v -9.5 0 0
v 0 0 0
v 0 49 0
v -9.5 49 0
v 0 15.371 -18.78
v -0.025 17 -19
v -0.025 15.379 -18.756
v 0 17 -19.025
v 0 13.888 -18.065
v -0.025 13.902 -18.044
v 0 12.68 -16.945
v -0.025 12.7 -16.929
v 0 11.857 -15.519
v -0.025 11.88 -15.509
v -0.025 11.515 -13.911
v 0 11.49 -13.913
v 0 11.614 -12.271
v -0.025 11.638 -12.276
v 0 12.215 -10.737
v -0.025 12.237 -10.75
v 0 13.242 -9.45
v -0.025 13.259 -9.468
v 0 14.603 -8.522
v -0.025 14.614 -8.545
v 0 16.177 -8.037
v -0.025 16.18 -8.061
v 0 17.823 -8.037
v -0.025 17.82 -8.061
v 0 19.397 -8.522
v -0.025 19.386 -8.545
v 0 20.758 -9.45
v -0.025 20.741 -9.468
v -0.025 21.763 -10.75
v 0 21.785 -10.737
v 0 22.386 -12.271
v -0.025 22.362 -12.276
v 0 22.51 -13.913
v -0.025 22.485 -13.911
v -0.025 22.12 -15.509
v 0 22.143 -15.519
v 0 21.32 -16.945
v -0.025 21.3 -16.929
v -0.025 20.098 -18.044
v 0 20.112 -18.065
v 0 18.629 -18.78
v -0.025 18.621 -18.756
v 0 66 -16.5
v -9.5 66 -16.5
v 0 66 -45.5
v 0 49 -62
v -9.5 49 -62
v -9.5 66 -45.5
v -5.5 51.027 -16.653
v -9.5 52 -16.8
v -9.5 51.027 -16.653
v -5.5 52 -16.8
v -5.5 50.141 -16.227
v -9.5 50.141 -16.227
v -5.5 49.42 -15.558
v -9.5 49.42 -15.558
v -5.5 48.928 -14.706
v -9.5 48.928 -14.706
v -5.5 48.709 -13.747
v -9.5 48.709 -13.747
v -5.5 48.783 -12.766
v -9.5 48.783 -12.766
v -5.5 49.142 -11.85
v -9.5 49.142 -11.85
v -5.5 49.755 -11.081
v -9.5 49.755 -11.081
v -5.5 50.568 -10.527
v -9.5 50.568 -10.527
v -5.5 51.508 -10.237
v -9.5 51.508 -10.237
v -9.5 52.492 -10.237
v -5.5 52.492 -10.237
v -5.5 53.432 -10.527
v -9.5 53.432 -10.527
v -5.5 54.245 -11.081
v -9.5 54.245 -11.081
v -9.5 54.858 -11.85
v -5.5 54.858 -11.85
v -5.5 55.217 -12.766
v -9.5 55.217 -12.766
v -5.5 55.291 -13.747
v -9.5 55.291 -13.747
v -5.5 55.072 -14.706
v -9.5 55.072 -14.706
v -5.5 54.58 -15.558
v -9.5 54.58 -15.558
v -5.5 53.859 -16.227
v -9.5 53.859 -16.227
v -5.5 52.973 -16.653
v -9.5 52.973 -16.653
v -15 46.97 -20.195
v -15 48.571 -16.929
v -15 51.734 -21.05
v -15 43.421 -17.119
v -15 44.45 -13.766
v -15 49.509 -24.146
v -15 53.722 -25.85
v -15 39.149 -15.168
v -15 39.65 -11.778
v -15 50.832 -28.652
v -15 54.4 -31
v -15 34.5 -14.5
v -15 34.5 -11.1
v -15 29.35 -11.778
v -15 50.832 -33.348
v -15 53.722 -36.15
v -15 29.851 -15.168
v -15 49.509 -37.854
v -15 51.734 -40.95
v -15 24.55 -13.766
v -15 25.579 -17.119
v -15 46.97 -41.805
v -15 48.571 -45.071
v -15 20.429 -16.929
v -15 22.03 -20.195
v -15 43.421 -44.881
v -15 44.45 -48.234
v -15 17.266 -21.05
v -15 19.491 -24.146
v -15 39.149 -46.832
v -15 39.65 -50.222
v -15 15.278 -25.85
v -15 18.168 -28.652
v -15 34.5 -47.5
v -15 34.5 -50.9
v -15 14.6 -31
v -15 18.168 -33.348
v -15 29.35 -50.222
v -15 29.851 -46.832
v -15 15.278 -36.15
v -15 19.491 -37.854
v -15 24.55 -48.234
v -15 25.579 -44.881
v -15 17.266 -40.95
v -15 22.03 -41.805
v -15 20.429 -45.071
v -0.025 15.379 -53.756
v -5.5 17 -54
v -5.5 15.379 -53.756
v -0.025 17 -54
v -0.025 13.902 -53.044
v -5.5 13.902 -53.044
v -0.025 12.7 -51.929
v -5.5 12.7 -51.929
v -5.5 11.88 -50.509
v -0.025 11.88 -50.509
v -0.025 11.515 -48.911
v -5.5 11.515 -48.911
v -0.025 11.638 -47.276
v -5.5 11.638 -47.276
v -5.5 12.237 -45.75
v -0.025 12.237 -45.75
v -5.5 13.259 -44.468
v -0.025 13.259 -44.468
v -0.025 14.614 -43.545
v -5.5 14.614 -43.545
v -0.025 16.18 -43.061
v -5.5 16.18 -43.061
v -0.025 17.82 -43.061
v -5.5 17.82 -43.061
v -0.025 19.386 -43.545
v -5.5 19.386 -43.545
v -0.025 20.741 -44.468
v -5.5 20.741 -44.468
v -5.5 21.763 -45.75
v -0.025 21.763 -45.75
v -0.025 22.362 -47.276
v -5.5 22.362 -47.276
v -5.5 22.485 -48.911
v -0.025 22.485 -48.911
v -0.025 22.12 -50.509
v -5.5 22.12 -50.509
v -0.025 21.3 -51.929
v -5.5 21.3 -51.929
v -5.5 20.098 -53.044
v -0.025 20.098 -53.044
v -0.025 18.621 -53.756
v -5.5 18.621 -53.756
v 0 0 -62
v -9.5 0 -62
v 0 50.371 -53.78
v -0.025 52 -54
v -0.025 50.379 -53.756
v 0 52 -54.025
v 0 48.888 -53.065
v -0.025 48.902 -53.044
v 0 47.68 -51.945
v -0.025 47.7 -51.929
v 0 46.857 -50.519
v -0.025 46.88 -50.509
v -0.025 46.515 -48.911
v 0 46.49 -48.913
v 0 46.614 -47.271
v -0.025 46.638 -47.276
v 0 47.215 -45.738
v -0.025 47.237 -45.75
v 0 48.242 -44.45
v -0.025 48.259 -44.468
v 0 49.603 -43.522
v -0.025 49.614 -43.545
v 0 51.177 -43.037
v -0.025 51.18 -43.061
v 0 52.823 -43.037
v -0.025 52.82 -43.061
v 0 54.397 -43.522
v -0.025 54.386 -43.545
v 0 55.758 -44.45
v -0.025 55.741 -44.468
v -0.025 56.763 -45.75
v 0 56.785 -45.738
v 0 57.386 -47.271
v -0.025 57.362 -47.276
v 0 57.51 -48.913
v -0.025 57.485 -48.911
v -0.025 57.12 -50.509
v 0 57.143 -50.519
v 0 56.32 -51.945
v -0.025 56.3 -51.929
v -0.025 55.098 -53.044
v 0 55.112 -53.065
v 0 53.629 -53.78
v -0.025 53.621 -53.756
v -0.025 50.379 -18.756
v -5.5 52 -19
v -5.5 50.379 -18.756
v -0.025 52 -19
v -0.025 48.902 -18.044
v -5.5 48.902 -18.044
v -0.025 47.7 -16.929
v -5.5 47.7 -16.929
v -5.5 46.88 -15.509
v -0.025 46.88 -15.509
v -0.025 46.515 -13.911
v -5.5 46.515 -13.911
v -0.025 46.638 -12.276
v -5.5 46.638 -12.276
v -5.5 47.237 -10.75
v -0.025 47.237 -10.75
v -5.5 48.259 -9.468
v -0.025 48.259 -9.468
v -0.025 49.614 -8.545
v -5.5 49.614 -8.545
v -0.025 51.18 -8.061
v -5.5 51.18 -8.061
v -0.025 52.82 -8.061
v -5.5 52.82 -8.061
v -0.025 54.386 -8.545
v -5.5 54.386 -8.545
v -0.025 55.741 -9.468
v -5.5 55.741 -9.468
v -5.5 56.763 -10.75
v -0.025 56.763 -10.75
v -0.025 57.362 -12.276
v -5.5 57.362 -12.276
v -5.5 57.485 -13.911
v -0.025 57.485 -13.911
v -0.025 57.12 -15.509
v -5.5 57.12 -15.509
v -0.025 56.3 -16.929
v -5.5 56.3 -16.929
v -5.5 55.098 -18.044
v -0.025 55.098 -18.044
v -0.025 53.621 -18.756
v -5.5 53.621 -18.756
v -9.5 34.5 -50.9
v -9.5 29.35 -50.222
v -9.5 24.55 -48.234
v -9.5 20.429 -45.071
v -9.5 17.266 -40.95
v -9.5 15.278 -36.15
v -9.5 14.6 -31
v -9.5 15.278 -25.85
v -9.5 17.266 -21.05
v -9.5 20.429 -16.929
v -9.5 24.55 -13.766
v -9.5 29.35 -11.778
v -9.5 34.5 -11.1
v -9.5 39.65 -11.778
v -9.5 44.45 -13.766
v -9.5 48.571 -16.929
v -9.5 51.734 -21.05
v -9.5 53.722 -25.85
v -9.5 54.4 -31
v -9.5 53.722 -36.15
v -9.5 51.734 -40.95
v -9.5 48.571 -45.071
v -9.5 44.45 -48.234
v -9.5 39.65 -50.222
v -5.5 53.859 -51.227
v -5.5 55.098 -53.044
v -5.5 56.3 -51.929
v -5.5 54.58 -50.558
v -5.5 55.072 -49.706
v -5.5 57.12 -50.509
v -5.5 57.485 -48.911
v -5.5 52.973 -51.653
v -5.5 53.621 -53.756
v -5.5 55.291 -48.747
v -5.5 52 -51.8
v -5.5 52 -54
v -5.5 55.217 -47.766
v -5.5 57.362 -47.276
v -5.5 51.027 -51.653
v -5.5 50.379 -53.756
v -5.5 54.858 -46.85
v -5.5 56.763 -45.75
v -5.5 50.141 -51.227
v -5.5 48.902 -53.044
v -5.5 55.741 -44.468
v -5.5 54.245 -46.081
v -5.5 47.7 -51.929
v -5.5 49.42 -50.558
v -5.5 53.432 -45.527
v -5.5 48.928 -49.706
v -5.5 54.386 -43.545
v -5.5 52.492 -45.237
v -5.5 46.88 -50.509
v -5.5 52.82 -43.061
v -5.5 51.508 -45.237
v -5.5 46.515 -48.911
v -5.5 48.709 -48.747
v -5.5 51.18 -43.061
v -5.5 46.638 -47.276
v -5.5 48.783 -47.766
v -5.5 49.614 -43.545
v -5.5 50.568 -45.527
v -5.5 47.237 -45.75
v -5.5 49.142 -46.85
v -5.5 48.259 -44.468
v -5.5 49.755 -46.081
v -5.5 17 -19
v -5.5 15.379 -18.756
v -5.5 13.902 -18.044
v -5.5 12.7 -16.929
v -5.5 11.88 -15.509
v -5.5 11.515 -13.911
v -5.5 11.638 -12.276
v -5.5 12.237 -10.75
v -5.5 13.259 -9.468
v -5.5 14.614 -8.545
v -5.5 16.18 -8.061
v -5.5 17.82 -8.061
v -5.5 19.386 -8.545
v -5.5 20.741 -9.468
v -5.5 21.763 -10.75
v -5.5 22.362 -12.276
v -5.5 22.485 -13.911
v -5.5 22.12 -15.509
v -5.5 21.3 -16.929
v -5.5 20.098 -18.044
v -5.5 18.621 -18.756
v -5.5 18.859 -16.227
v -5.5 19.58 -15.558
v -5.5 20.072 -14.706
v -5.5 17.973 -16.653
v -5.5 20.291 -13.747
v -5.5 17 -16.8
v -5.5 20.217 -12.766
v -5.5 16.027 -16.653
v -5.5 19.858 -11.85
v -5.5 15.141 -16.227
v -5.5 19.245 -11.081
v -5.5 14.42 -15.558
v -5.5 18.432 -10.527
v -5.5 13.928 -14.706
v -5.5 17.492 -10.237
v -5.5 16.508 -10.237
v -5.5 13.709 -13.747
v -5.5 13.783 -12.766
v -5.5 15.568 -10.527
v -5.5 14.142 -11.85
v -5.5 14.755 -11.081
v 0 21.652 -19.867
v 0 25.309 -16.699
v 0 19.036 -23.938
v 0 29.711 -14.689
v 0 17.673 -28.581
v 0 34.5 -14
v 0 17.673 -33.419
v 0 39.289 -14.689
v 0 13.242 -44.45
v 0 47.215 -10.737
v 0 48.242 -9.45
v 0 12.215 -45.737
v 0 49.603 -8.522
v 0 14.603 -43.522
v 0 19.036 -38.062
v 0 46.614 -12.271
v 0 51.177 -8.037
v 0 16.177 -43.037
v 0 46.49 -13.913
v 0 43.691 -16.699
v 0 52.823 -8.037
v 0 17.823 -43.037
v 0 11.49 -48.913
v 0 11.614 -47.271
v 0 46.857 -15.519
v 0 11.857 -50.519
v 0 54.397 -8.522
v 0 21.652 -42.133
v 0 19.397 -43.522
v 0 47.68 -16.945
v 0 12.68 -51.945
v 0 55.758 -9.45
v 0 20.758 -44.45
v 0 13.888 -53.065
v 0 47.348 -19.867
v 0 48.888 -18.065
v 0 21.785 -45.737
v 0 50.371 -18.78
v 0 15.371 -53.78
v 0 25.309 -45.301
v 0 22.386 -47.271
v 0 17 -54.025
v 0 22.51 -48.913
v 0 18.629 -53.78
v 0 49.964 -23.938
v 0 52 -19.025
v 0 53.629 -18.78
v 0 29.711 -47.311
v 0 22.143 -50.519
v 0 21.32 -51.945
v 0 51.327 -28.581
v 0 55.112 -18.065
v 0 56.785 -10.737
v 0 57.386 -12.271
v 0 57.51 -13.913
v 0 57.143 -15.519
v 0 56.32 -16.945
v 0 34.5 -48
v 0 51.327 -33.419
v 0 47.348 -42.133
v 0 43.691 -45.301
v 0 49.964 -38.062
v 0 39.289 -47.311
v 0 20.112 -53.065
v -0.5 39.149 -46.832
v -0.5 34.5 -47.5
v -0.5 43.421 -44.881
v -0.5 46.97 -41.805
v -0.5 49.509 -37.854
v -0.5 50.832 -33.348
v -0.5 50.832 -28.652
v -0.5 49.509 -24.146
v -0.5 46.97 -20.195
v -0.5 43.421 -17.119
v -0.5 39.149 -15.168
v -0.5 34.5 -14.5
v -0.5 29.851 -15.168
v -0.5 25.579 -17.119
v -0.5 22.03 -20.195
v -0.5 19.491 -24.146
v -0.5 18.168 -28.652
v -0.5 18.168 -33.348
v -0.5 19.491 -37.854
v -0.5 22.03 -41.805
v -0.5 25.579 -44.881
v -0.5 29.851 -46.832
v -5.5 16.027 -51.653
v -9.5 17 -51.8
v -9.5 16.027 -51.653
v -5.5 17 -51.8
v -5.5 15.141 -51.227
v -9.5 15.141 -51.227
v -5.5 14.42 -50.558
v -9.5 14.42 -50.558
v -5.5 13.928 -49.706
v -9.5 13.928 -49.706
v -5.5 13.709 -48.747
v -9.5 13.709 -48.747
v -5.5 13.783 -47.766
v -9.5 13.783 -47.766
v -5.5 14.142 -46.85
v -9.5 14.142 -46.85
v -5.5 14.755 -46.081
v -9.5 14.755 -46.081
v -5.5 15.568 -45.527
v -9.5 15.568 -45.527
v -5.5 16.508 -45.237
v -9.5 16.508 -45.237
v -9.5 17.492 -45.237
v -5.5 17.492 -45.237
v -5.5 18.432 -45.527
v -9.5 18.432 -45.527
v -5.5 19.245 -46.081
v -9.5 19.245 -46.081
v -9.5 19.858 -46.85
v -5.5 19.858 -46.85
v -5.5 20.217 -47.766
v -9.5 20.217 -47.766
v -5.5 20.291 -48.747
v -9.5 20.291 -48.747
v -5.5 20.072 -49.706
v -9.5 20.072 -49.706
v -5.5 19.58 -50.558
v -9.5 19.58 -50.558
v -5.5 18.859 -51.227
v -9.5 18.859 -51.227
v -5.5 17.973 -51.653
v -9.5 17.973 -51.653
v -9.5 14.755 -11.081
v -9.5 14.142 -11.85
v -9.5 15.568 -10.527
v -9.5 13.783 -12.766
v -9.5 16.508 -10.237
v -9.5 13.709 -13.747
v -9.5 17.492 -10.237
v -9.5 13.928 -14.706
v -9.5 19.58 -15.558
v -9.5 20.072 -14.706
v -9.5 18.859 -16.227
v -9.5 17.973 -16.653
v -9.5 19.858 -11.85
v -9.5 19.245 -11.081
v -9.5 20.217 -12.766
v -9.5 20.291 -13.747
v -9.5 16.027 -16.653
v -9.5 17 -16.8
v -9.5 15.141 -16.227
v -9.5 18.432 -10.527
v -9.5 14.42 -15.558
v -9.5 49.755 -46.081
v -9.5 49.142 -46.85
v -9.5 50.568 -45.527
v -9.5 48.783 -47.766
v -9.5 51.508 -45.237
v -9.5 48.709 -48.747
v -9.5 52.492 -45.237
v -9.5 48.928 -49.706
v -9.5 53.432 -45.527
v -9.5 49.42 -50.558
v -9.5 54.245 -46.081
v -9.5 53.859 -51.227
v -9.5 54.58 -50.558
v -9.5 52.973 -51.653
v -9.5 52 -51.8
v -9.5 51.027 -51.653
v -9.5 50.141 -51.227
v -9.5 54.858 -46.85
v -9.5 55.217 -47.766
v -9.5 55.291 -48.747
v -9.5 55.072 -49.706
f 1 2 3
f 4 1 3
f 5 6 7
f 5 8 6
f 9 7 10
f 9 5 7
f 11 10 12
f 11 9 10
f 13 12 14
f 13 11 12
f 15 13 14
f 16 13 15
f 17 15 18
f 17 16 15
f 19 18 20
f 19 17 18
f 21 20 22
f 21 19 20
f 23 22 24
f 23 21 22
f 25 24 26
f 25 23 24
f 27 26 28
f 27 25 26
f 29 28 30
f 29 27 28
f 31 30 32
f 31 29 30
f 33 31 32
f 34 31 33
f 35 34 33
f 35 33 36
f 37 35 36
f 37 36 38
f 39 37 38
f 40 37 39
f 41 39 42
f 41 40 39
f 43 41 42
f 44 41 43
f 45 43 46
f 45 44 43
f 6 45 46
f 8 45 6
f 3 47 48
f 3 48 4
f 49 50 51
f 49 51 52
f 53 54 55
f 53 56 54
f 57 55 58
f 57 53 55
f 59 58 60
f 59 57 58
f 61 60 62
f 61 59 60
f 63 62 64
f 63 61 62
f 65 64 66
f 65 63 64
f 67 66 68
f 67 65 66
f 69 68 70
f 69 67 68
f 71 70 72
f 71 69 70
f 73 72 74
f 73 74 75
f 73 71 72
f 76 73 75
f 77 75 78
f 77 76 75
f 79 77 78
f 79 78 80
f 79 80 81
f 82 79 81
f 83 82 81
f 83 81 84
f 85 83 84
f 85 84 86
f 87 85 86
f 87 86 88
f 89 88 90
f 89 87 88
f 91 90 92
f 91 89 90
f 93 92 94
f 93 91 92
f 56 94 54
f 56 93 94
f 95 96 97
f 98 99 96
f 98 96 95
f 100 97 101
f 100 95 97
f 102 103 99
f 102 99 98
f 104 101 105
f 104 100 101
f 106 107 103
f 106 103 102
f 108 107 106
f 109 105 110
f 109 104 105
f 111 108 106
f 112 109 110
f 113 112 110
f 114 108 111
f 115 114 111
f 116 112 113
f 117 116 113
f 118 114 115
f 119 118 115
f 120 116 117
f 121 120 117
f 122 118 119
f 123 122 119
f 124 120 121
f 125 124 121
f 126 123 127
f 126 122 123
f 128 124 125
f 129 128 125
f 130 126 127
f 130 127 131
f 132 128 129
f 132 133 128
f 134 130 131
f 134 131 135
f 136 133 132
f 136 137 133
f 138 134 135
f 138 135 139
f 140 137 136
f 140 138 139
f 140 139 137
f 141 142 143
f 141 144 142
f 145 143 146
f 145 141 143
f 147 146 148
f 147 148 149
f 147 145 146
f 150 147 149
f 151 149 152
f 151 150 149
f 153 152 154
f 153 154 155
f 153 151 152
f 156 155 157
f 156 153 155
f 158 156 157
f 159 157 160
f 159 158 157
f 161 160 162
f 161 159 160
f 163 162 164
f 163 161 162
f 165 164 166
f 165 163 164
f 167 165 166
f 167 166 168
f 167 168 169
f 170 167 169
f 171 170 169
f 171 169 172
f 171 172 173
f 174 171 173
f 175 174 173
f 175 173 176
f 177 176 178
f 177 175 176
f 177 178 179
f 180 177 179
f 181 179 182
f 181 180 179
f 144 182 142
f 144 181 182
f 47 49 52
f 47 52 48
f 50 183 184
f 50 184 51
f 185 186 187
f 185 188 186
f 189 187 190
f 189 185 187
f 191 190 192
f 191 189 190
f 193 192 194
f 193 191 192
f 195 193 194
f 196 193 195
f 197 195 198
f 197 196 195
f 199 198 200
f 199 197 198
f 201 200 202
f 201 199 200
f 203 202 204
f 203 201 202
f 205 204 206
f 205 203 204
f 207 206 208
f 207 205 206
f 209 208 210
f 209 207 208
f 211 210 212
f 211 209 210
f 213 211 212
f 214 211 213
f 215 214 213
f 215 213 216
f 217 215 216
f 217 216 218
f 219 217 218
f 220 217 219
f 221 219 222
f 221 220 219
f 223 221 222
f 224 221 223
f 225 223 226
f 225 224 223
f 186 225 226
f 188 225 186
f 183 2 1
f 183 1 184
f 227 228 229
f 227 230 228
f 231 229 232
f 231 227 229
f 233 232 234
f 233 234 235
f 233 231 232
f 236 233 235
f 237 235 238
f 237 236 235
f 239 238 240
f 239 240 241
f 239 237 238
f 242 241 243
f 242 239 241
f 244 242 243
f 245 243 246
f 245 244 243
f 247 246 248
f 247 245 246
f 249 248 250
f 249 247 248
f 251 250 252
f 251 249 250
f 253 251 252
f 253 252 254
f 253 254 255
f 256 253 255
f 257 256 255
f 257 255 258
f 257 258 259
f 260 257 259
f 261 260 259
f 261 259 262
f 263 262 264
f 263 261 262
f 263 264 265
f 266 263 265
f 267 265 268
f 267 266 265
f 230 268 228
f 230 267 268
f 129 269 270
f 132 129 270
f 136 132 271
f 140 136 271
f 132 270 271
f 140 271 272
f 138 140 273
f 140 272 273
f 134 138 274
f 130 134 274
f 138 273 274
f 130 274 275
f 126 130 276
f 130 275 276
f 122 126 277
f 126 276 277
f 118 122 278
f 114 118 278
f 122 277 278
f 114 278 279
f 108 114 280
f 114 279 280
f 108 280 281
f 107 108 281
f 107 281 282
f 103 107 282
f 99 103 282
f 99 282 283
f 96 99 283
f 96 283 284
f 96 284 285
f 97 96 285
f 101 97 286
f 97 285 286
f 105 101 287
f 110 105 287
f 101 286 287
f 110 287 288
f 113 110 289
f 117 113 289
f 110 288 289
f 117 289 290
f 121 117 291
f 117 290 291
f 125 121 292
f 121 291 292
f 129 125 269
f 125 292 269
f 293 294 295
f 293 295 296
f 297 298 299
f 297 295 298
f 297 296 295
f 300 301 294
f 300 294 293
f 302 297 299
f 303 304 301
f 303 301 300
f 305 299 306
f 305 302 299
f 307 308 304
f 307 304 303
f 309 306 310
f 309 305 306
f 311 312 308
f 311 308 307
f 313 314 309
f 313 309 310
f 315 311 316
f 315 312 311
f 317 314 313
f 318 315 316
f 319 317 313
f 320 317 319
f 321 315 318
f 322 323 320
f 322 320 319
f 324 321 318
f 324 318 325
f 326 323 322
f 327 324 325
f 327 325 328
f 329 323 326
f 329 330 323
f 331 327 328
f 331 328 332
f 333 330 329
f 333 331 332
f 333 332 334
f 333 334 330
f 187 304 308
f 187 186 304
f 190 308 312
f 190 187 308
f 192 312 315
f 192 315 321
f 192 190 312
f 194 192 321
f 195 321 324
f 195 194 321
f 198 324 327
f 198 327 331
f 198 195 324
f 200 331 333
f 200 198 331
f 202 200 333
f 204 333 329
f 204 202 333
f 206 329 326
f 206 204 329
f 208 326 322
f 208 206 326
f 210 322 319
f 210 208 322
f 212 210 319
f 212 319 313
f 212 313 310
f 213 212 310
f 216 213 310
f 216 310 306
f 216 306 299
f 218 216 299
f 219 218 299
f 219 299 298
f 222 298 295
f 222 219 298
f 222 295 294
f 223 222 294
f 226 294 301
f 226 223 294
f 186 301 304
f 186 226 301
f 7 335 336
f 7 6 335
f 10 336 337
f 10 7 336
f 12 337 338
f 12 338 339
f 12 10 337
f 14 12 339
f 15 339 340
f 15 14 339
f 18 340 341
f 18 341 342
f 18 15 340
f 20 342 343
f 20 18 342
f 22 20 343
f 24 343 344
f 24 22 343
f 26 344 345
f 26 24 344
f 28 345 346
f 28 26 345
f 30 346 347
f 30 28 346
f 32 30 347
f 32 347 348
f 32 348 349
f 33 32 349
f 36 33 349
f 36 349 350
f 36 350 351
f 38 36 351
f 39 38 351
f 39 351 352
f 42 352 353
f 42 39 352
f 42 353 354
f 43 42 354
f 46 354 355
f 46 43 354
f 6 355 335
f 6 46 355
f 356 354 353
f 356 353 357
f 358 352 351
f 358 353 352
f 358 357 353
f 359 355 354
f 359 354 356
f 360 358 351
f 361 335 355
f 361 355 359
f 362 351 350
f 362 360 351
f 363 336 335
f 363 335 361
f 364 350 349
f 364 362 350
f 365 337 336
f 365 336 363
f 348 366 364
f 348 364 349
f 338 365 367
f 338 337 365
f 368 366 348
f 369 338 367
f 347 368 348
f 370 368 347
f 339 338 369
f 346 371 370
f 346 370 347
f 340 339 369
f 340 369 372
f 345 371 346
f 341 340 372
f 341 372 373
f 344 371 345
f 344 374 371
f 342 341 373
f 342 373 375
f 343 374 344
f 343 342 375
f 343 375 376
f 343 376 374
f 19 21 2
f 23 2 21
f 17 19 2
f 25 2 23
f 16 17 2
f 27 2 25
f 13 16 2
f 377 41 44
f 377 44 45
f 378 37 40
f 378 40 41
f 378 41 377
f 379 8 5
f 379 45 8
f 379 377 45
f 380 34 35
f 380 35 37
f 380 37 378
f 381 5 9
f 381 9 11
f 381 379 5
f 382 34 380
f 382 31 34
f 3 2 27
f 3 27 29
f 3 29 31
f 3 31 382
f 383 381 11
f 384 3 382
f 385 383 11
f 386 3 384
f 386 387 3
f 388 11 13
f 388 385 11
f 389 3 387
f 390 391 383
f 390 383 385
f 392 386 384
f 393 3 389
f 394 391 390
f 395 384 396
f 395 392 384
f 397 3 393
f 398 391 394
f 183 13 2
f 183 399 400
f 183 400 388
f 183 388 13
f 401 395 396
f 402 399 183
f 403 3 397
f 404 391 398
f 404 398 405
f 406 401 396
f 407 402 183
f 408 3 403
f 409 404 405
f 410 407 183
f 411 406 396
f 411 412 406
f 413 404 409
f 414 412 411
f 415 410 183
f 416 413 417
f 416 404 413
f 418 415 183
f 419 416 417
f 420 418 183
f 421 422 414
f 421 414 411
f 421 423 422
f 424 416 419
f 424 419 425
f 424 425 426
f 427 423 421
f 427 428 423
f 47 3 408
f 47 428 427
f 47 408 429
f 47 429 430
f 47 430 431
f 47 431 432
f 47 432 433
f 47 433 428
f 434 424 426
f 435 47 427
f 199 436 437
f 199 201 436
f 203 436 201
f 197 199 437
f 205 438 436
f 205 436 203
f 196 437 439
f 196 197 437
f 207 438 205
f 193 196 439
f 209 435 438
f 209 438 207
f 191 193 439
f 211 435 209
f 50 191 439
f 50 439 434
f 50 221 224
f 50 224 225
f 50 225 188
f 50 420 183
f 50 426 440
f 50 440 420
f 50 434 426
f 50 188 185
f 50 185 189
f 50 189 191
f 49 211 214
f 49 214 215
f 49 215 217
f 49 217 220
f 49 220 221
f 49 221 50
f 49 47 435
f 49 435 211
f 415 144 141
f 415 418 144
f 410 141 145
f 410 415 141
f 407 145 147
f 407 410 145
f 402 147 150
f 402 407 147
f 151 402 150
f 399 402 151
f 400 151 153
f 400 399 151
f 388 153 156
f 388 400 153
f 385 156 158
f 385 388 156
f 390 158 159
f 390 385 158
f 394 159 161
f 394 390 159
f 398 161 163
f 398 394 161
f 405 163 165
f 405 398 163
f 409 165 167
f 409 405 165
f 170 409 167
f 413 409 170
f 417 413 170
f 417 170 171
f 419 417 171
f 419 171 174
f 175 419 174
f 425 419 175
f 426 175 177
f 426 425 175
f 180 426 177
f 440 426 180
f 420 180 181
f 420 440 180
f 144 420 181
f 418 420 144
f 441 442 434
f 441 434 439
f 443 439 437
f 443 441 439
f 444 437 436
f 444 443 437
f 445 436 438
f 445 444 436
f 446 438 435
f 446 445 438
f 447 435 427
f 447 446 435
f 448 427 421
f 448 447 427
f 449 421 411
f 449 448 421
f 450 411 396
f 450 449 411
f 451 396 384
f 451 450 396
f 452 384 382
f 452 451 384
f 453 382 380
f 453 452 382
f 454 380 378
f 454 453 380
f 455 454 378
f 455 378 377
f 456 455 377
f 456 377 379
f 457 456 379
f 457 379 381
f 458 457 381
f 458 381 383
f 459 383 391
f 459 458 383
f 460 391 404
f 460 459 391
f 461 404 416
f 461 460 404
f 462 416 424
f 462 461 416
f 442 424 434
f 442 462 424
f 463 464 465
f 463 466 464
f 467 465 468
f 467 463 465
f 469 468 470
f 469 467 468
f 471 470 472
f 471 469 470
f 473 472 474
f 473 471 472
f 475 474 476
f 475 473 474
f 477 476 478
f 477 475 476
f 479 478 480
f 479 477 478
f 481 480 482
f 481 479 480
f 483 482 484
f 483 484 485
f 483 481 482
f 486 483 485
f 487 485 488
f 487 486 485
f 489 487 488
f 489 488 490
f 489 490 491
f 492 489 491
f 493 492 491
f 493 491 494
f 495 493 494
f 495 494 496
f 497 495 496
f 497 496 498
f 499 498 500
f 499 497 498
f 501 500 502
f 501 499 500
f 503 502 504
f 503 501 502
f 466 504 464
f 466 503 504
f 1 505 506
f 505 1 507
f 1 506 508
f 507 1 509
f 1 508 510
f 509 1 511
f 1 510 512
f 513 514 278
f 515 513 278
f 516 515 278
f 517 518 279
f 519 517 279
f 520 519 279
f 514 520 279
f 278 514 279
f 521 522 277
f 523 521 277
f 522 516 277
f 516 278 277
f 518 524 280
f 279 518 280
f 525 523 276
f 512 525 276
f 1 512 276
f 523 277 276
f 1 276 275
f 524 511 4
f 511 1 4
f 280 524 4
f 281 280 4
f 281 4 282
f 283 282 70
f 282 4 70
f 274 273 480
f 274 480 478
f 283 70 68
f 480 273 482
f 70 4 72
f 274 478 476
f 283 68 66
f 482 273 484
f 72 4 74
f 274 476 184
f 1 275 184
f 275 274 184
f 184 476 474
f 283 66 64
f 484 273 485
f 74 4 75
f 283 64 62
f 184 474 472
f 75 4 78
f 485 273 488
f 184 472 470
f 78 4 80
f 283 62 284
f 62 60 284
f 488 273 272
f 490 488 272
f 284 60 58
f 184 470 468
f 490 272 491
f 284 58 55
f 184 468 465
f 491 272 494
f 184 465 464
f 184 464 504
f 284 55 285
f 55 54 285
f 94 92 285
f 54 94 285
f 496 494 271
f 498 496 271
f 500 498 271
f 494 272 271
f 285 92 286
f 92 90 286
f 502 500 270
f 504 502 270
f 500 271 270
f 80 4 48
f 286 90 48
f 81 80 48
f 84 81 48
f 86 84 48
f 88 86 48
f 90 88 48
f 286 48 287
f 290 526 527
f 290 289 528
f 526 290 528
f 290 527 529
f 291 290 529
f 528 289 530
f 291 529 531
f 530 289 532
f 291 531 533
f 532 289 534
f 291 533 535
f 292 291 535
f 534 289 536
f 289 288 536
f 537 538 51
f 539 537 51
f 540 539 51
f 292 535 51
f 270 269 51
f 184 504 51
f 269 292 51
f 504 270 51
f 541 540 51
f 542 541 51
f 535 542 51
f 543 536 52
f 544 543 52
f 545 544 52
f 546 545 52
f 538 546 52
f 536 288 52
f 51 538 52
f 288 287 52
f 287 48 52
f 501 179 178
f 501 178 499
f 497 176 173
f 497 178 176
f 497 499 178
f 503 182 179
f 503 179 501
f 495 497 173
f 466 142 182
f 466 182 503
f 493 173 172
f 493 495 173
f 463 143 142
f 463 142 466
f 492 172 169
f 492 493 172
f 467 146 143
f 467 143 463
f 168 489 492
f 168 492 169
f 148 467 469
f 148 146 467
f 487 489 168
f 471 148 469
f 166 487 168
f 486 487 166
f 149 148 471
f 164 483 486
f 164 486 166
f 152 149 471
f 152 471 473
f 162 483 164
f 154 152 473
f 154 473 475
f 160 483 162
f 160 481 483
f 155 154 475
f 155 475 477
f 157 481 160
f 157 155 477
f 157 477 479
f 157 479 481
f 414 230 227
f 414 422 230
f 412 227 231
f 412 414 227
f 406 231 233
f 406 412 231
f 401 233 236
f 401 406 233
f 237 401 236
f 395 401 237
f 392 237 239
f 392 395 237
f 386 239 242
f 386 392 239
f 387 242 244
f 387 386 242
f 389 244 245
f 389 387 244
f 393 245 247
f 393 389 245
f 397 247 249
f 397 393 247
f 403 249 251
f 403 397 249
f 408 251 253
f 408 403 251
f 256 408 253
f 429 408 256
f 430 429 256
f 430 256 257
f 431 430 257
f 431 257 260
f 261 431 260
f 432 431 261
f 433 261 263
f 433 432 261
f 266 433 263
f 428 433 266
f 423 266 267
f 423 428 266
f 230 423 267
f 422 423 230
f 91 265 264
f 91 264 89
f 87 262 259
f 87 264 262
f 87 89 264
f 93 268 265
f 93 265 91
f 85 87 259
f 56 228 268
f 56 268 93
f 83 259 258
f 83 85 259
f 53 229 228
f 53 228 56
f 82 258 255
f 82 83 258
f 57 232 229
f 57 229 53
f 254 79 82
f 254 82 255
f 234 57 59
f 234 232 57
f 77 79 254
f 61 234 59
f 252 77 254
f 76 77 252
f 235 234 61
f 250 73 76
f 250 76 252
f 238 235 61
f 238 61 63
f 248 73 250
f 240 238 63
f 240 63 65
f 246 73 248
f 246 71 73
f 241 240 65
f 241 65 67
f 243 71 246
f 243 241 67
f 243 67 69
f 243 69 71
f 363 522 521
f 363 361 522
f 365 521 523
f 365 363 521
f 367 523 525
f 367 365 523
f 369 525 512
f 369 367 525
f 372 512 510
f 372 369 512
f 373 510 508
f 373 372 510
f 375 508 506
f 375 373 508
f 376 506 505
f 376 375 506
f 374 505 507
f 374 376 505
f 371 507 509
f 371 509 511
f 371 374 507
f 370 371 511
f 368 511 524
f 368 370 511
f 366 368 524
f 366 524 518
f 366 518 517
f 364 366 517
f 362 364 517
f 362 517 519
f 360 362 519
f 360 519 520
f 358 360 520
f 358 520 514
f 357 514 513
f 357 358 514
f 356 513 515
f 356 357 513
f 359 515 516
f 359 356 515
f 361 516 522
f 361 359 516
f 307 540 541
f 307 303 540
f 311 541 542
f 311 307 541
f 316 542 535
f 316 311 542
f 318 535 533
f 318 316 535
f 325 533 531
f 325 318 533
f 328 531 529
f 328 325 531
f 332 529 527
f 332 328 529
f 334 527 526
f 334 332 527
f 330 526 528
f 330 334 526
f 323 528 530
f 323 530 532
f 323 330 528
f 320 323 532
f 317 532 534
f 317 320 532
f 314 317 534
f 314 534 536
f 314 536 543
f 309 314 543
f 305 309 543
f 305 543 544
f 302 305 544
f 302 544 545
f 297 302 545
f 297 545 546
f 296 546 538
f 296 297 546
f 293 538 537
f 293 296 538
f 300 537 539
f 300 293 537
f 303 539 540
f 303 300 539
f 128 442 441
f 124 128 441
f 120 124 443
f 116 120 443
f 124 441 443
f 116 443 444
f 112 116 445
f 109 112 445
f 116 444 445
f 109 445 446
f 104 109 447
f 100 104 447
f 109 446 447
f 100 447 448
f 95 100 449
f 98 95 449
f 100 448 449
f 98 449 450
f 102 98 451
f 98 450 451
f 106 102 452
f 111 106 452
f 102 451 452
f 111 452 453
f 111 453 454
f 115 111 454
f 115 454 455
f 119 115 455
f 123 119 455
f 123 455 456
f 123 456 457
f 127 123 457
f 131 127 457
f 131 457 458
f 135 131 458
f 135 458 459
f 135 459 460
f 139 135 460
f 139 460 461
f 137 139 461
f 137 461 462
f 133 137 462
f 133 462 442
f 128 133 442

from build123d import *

# Parameters (mm, degrees)
ESBO_O1_W                                    = 31
ESBO_O1_H                                    = 49
RESSALTO_EXTRUS_O1_DEPTH                     = 9.5
REBAIXO_PARA_PARAFUSO_COM_CABE_A_RED_2_COUNT = 2
REBAIXO_PARA_PARAFUSO_COM_CABE_A_RED_2_PITCH = 35
REBAIXO_PARA_PARAFUSO_COM_CABE_A_RED_3_COUNT = 2
REBAIXO_PARA_PARAFUSO_COM_CABE_A_RED_3_PITCH = 49.497474683
REBAIXO_PARA_PARAFUSO_COM_CABE_A_RED_4_COUNT = 2
REBAIXO_PARA_PARAFUSO_COM_CABE_A_RED_4_PITCH = 35
ESBO_O8_R                                    = 19.9
RESSALTO_EXTRUS_O2_DEPTH                     = 5.5
ESBO_O5_R                                    = 16.5
CORTE_EXTRUS_O1_DEPTH                        = 92.787798753
CHANFRO1_SIZE                                = 0.5


with BuildPart() as part:
    # Esboço1 → Ressalto-extrusão1 (new body)
    with BuildSketch(Plane(origin=(0, 0, 0), x_dir=(0, 0, -1), z_dir=(1, 0, 0))):
        Polygon((16.5, 66), (0, 49), (31, 49), (31, 66), align=None)
        Polygon((31, 66), (31, 49), (62, 49), (45.5, 66), align=None)
        with Locations((15.5, 24.5)):
            Rectangle(ESBO_O1_W, ESBO_O1_H)
        with Locations((46.5, 24.5)):
            Rectangle(ESBO_O1_W, ESBO_O1_H)
    extrude(amount=-RESSALTO_EXTRUS_O1_DEPTH)

    # Esboço4 → Rebaixo para parafuso com cabeça redonda de M61 (revolve, cut)
    with BuildSketch(Plane(origin=(0, 52, -13.5), x_dir=(0, 0, -1), z_dir=(0, 1, 0))):
        Polygon((0, 0), (0, 9.5), (3.3, 9.5), (3.3, 5.5), (5.5, 5.5), (5.5, 0.025), (5.525, 0), align=None)
    rebaixo_para_parafuso_com_cabe_a_redonda = revolve(axis=Axis((6.35, 52, -13.5), (-1, 0, 0)), mode=Mode.SUBTRACT)

    # Rebaixo para parafuso com cabe_a red 2: Rebaixo para parafuso com cabeça redonda de M61 ×2
    with Locations(*[(0, 0, -i * REBAIXO_PARA_PARAFUSO_COM_CABE_A_RED_2_PITCH) for i in range(1, REBAIXO_PARA_PARAFUSO_COM_CABE_A_RED_2_COUNT)]):
        add(rebaixo_para_parafuso_com_cabe_a_redonda, mode=Mode.SUBTRACT)

    # Rebaixo para parafuso com cabe_a red 3: Rebaixo para parafuso com cabeça redonda de M61 ×2
    with Locations(*[Vector(0, -0.7071067811865477, -0.7071067811865475) * (i * REBAIXO_PARA_PARAFUSO_COM_CABE_A_RED_3_PITCH) for i in range(1, REBAIXO_PARA_PARAFUSO_COM_CABE_A_RED_3_COUNT)]):
        add(rebaixo_para_parafuso_com_cabe_a_redonda, mode=Mode.SUBTRACT)

    # Rebaixo para parafuso com cabe_a red 4: Rebaixo para parafuso com cabeça redonda de M61 ×2
    with Locations(*[(0, -i * REBAIXO_PARA_PARAFUSO_COM_CABE_A_RED_4_PITCH, 0) for i in range(1, REBAIXO_PARA_PARAFUSO_COM_CABE_A_RED_4_COUNT)]):
        add(rebaixo_para_parafuso_com_cabe_a_redonda, mode=Mode.SUBTRACT)

    # Esboço8 → Ressalto-extrusão2 (add)
    with BuildSketch(Plane.ZY.offset(9.5)):
        with Locations(Location((-31, 34.5, 0), (0, 0, 180))):
            Circle(ESBO_O8_R)
    extrude(amount=RESSALTO_EXTRUS_O2_DEPTH)

    # Esboço5 → Corte-extrusão1 (cut, through all)
    with BuildSketch(Plane(origin=(0, 0, 0), x_dir=(0, 0, -1), z_dir=(1, 0, 0))):
        with Locations((31, 34.5)):
            Circle(ESBO_O5_R)
    extrude(amount=-CORTE_EXTRUS_O1_DEPTH, mode=Mode.SUBTRACT)

    # Chanfro1
    chanfro1_edges = [part.edges().sort_by_distance(p)[0] for p in [
        (0, 34.5, -14.5),
    ]]
    chamfer(chanfro1_edges, length=CHANFRO1_SIZE)


solid = part.part
